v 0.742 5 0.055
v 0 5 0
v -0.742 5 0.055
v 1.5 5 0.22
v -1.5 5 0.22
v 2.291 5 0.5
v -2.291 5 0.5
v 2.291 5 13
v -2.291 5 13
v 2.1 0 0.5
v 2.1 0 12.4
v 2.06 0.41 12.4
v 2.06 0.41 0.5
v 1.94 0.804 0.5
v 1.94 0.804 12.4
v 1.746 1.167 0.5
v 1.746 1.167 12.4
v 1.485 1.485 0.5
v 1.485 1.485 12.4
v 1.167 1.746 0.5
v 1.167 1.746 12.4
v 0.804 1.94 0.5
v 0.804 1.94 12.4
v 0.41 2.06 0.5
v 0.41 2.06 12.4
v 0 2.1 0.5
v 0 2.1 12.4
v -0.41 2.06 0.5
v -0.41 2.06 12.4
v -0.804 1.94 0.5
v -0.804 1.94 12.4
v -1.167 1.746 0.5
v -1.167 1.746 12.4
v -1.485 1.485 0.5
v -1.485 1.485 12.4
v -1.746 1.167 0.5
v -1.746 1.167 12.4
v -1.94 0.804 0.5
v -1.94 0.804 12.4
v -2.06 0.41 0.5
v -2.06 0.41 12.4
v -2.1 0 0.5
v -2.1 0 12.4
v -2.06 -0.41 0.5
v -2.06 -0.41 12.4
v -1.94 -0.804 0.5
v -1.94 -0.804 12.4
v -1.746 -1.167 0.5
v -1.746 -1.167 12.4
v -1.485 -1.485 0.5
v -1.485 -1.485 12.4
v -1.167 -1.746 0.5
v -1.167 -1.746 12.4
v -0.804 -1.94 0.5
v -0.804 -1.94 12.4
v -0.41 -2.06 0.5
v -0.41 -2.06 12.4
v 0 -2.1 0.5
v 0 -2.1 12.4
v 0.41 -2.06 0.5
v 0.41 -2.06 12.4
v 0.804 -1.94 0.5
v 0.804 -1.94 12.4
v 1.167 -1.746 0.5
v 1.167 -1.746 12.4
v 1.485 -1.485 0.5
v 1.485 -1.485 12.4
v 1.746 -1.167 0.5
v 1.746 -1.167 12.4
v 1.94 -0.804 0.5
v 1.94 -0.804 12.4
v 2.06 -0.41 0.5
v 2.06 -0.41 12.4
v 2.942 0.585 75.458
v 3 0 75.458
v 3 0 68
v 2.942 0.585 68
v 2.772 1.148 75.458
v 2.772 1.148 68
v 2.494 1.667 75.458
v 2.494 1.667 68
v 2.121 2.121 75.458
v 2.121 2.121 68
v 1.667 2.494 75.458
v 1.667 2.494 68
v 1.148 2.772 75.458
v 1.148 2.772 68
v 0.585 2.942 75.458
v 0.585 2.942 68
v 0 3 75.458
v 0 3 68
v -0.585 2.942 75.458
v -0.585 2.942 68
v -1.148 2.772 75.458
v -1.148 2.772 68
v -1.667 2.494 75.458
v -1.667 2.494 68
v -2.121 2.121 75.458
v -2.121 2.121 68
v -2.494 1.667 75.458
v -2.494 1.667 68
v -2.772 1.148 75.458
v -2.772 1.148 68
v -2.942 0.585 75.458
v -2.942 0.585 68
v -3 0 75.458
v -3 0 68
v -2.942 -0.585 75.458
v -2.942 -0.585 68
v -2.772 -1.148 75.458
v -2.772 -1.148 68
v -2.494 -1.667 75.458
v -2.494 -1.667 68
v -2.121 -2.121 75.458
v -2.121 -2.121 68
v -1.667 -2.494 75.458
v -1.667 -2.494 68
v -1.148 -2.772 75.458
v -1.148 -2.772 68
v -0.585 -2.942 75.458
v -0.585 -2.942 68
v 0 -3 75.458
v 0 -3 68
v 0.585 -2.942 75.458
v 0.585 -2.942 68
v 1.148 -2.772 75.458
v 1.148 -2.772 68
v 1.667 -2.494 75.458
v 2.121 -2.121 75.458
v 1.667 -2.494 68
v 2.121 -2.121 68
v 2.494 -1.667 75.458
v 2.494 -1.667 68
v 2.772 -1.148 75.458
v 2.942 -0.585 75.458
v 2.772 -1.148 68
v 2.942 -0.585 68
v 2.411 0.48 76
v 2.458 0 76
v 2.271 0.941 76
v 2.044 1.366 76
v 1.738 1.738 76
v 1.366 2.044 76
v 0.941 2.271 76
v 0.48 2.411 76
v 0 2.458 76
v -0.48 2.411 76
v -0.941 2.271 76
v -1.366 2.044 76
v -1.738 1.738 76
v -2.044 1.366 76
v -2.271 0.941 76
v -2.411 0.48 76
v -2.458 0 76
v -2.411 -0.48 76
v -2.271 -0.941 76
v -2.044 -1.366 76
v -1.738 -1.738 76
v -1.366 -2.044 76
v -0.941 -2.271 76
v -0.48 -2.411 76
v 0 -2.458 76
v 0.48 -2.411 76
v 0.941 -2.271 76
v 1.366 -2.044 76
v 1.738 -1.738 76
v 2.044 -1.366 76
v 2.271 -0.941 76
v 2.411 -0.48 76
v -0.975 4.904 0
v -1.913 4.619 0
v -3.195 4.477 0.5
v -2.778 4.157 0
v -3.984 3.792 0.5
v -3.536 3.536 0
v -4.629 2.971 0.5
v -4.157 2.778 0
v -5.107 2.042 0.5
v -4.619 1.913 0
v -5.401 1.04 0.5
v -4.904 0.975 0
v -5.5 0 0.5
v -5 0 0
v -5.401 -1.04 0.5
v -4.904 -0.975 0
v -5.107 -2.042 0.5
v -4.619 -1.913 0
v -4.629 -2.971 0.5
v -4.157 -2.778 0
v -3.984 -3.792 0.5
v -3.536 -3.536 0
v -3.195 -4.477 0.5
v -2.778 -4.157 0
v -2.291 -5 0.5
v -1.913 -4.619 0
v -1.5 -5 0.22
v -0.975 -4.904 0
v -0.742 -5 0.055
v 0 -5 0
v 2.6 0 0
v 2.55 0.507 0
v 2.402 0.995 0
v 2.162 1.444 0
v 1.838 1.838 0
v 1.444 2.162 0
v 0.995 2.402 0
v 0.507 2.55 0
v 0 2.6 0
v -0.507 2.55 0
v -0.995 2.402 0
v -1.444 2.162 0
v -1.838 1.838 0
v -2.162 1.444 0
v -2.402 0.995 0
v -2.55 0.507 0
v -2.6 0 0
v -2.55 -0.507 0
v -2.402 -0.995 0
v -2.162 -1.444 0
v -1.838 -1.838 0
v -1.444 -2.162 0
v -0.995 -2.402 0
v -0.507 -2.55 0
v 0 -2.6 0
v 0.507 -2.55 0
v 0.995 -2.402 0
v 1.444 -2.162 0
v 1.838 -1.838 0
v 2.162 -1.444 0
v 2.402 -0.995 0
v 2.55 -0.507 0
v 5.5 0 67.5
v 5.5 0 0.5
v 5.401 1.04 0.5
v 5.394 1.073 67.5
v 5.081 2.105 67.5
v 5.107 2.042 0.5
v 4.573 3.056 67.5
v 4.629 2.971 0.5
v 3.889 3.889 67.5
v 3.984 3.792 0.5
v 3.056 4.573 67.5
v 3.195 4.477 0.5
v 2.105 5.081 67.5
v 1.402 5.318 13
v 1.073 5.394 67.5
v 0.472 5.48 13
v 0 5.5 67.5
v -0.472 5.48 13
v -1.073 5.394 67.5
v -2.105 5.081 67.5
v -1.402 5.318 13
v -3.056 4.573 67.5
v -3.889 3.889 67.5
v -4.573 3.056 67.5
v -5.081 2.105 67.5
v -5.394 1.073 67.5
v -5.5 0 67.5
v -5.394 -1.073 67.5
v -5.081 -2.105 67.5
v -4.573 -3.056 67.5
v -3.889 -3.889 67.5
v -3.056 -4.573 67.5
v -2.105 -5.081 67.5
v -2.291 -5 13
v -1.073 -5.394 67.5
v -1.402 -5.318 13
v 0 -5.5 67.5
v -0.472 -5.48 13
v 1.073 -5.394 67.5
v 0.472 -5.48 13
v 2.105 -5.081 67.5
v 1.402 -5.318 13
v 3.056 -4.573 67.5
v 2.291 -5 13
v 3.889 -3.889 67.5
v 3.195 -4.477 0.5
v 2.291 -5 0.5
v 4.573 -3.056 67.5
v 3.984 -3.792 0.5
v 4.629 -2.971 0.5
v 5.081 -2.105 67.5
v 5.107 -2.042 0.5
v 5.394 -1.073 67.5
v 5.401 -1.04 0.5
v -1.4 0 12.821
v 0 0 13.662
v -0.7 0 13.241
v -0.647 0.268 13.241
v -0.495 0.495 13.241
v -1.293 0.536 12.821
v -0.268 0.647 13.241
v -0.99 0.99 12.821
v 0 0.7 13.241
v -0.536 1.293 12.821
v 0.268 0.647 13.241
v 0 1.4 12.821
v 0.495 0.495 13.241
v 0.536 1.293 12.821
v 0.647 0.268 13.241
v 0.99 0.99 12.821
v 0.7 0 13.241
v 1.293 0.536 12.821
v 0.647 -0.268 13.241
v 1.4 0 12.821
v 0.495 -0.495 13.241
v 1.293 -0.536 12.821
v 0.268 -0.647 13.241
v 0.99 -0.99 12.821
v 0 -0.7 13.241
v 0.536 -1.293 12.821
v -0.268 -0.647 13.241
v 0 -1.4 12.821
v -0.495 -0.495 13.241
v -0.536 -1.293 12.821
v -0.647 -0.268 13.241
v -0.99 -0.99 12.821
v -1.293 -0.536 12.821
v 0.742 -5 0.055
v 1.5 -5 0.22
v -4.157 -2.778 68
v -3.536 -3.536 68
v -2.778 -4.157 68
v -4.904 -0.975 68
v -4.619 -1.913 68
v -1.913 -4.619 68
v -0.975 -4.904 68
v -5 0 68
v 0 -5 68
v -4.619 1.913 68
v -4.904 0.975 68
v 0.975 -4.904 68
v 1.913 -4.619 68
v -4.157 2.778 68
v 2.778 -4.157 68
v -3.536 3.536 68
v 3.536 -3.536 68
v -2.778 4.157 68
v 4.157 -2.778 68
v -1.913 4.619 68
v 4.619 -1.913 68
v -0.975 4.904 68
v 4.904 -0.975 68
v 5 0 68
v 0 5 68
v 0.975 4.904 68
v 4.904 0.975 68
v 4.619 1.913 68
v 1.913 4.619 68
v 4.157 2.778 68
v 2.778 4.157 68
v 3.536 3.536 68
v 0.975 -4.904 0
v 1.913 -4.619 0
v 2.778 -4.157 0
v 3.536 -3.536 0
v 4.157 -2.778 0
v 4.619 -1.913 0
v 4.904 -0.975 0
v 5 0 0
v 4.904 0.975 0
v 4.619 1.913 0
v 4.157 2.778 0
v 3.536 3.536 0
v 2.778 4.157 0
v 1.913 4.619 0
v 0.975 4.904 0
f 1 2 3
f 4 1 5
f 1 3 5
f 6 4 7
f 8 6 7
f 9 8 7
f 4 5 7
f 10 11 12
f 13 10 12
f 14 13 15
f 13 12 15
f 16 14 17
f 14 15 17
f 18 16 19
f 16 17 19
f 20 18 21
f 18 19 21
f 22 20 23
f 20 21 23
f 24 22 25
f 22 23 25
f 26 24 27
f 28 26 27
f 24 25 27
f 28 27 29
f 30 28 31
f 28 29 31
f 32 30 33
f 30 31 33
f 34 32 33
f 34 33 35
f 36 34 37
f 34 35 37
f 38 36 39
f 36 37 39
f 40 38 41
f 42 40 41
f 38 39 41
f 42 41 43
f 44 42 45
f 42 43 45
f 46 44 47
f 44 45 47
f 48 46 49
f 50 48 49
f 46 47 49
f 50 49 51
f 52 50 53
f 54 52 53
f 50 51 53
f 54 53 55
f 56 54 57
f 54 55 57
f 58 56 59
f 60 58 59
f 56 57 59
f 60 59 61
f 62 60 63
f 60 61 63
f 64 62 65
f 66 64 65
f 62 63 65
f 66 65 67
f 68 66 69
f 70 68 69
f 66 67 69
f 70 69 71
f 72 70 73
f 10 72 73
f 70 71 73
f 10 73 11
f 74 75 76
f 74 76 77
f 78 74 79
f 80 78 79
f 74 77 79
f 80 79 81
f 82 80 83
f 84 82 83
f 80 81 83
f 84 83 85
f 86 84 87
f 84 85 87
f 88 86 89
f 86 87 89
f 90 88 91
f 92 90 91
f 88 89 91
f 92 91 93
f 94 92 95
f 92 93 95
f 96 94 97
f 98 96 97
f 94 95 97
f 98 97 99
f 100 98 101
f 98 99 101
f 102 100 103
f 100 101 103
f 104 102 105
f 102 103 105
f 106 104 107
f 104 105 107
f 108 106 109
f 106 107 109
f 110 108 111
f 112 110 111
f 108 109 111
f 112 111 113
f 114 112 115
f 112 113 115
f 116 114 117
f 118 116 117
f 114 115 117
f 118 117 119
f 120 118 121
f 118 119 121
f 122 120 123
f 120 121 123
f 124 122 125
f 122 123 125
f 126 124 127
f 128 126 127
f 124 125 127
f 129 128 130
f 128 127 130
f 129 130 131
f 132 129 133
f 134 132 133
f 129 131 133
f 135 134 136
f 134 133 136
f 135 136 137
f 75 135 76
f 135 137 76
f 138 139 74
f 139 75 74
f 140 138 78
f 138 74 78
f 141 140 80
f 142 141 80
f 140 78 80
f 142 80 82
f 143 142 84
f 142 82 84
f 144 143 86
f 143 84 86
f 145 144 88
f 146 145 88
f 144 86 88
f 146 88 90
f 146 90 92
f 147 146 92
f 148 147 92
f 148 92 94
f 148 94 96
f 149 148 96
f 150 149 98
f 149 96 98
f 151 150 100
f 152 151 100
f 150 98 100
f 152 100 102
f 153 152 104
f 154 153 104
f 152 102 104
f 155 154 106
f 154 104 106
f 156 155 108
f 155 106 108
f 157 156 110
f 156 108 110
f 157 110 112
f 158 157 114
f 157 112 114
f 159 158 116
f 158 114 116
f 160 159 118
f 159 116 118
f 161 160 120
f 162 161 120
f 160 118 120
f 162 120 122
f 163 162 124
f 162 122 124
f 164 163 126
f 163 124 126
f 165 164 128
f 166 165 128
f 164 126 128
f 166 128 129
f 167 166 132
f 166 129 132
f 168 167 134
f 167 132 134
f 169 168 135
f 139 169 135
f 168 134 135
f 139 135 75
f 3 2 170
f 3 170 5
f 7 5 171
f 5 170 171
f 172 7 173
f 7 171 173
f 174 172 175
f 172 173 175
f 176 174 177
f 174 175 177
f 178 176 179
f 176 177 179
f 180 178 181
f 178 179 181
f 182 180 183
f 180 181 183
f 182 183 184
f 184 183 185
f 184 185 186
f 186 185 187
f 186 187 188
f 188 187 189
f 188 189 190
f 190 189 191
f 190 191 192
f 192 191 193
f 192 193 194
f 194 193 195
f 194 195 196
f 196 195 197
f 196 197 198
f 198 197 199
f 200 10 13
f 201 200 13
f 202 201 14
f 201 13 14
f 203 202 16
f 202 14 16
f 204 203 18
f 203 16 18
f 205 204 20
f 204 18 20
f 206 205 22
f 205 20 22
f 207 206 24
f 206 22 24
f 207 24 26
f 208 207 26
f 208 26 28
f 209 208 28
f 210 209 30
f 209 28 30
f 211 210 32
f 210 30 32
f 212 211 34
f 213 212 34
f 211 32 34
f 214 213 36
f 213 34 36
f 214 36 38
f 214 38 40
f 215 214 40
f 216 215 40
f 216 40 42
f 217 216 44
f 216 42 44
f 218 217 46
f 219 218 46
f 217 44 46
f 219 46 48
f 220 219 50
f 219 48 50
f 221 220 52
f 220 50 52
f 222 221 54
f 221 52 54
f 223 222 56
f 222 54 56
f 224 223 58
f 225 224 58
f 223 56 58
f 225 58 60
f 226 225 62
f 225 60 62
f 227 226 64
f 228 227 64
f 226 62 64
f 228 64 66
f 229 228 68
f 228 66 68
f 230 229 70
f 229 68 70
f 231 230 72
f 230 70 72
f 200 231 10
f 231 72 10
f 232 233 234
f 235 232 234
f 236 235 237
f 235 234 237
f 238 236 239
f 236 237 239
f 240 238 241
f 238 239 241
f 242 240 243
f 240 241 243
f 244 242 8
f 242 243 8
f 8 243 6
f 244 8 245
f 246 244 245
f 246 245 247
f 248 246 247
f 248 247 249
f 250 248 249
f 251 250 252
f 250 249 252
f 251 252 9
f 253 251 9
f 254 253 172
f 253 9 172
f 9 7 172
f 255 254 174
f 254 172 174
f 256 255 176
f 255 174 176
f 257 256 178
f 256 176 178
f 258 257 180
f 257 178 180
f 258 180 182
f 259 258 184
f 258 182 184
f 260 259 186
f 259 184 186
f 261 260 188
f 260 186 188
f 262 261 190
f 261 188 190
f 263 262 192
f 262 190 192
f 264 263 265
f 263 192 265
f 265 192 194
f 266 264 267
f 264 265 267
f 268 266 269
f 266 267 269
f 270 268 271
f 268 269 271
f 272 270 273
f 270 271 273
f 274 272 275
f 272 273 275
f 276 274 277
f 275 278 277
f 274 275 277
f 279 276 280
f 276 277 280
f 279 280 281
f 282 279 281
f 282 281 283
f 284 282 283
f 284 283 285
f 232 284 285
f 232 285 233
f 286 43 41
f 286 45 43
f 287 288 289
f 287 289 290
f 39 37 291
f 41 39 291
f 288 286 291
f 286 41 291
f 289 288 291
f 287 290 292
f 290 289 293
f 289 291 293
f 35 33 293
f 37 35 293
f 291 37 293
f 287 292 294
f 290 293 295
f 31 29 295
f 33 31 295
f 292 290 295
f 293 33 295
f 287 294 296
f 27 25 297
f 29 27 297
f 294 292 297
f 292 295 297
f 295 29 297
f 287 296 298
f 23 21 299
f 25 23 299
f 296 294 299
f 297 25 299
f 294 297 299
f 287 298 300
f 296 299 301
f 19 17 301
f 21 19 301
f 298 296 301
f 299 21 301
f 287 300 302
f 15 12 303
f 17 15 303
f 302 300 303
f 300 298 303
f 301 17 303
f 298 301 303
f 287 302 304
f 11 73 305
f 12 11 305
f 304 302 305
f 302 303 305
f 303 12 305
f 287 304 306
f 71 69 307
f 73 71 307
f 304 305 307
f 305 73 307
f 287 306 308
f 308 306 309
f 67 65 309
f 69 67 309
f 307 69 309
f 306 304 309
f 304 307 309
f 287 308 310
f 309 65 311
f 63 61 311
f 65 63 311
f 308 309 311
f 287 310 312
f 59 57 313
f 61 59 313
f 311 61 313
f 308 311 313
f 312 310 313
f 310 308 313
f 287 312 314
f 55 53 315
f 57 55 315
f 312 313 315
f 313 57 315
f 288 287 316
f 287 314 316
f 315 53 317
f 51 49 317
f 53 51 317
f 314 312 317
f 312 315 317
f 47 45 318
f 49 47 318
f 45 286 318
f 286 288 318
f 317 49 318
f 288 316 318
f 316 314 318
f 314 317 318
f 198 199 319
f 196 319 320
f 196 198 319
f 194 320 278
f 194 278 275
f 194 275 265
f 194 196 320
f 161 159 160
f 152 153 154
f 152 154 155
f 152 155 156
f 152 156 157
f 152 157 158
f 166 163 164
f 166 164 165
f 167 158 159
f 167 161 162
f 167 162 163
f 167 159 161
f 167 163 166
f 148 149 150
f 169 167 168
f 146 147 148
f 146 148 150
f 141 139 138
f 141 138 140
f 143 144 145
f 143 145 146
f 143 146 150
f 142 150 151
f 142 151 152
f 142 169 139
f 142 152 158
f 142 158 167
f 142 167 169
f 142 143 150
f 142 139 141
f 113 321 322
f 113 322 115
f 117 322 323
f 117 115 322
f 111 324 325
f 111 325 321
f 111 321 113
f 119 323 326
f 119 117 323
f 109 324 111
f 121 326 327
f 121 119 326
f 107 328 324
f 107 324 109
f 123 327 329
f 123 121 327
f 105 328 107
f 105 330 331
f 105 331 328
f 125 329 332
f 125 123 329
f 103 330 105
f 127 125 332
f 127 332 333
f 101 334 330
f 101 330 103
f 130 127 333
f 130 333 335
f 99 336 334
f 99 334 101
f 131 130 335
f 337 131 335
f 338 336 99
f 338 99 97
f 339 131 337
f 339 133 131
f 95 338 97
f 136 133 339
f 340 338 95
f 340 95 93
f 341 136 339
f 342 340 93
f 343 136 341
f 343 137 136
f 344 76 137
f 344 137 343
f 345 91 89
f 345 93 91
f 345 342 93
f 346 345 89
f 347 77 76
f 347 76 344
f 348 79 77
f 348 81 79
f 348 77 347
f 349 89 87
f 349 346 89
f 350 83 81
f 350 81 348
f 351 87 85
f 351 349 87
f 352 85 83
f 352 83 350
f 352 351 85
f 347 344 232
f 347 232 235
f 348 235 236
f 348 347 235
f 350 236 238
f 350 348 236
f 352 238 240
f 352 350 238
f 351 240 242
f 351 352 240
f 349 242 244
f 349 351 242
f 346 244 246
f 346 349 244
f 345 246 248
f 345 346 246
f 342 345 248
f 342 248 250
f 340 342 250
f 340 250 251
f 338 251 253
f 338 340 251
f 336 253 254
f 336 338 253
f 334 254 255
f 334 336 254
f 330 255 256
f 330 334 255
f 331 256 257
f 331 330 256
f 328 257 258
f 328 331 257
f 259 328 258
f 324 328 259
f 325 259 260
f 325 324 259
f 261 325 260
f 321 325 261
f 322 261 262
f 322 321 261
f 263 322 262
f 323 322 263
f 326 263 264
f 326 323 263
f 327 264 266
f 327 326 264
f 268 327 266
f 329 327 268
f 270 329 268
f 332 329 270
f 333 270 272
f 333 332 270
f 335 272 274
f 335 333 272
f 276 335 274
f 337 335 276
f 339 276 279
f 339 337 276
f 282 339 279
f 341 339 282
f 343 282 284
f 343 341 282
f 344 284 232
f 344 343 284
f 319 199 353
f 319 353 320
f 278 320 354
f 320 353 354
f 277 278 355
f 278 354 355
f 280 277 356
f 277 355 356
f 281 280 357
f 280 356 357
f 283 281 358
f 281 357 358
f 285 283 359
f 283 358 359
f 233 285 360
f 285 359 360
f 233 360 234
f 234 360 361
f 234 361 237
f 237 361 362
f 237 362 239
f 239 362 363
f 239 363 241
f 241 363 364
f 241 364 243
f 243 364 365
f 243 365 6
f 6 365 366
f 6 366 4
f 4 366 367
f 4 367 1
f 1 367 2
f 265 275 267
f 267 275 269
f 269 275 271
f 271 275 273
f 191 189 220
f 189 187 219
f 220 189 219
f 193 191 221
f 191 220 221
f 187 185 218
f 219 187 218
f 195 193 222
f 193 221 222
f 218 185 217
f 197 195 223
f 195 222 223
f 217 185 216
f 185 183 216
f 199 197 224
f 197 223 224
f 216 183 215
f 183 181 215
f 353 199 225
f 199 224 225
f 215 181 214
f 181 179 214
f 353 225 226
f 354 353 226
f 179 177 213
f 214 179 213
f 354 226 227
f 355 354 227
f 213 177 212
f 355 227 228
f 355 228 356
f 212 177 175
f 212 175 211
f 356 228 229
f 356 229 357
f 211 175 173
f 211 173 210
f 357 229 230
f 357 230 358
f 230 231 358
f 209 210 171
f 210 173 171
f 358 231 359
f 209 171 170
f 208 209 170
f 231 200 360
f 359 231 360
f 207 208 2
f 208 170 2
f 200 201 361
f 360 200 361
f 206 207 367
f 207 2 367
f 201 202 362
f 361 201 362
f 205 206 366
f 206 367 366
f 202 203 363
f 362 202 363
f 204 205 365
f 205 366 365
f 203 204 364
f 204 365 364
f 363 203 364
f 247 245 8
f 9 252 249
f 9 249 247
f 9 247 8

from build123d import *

# Parameters (mm, degrees)
SKETCH_1_R             = 5.5
EXTRUDE_1_DEPTH        = 68
CHAMFER_1_SIZE         = 0.5
SKETCH_2_R             = 3.3
EXTRUDE_2_DEPTH        = 8
HOLE_WIZARD_M5_1_D     = 4.2
HOLE_WIZARD_M5_1_DEPTH = 12.4
HOLE_WIZARD_M5_1_TIP   = 1.2618073
CHAMFER_3_SIZE         = 0.5
SKETCH_6_W             = 10
SKETCH_6_H             = 3
CUT_EXTRUDE_1_DEPTH    = 13


# Read off the part's stored shape, not the designer's step: M6 机械螺纹 螺柱1
with BuildPart() as part:
    # 草图1 → 拉伸1 (new body)
    with BuildSketch(Plane.XY):
        Circle(SKETCH_1_R)
    extrude(amount=EXTRUDE_1_DEPTH)

    # 倒角1
    chamfer_1_edges = [part.edges().sort_by_distance(p)[0] for p in [
        (-5.5, 0, 0),
        (-5.5, 0, 68),
    ]]
    chamfer(chamfer_1_edges, length=CHAMFER_1_SIZE)

    # 草图2 → 拉伸2 (add)
    with BuildSketch(Plane.XY.offset(68)):
        Circle(SKETCH_2_R)
    extrude(amount=EXTRUDE_2_DEPTH)

    # M5 螺纹孔1
    with Locations(Plane(origin=(0, 0, 0), x_dir=(-1, 0, 0), z_dir=(0, 0, -1))):
        with Locations((0, 0)):
            Hole(HOLE_WIZARD_M5_1_D / 2, depth=HOLE_WIZARD_M5_1_DEPTH)
            with Locations((0, 0, -(HOLE_WIZARD_M5_1_DEPTH + HOLE_WIZARD_M5_1_TIP / 2))):  # 118° drill point
                Cone(0, HOLE_WIZARD_M5_1_D / 2, HOLE_WIZARD_M5_1_TIP, mode=Mode.SUBTRACT)

    # 倒角3
    chamfer_3_edges = [part.edges().sort_by_distance(p)[0] for p in [
        (-2.1, 0, 0),
    ]]
    chamfer(chamfer_3_edges, length=CHAMFER_3_SIZE)

    # 草图6 → 切除-拉伸1 (cut)
    with BuildSketch(Plane(origin=(0, 0, 0), x_dir=(-1, 0, 0), z_dir=(0, 0, -1))):
        with Locations((0, 6.5)):
            Rectangle(SKETCH_6_W, SKETCH_6_H)
        with Locations((0, -6.5)):
            Rectangle(SKETCH_6_W, SKETCH_6_H)
    extrude(amount=-CUT_EXTRUDE_1_DEPTH, mode=Mode.SUBTRACT)

    # M6 机械螺纹 螺柱1 outline → M6 机械螺纹 螺柱1 (revolve, cut)
    with BuildSketch(Plane.XZ):
        Polygon((3.3, 76), (2.4585, 76), (3, 75.4585), (3, 68), (3.3, 68), align=None)
    revolve(axis=Axis((0, 0, 0), (0, 0, 1)), mode=Mode.SUBTRACT)


solid = part.part
